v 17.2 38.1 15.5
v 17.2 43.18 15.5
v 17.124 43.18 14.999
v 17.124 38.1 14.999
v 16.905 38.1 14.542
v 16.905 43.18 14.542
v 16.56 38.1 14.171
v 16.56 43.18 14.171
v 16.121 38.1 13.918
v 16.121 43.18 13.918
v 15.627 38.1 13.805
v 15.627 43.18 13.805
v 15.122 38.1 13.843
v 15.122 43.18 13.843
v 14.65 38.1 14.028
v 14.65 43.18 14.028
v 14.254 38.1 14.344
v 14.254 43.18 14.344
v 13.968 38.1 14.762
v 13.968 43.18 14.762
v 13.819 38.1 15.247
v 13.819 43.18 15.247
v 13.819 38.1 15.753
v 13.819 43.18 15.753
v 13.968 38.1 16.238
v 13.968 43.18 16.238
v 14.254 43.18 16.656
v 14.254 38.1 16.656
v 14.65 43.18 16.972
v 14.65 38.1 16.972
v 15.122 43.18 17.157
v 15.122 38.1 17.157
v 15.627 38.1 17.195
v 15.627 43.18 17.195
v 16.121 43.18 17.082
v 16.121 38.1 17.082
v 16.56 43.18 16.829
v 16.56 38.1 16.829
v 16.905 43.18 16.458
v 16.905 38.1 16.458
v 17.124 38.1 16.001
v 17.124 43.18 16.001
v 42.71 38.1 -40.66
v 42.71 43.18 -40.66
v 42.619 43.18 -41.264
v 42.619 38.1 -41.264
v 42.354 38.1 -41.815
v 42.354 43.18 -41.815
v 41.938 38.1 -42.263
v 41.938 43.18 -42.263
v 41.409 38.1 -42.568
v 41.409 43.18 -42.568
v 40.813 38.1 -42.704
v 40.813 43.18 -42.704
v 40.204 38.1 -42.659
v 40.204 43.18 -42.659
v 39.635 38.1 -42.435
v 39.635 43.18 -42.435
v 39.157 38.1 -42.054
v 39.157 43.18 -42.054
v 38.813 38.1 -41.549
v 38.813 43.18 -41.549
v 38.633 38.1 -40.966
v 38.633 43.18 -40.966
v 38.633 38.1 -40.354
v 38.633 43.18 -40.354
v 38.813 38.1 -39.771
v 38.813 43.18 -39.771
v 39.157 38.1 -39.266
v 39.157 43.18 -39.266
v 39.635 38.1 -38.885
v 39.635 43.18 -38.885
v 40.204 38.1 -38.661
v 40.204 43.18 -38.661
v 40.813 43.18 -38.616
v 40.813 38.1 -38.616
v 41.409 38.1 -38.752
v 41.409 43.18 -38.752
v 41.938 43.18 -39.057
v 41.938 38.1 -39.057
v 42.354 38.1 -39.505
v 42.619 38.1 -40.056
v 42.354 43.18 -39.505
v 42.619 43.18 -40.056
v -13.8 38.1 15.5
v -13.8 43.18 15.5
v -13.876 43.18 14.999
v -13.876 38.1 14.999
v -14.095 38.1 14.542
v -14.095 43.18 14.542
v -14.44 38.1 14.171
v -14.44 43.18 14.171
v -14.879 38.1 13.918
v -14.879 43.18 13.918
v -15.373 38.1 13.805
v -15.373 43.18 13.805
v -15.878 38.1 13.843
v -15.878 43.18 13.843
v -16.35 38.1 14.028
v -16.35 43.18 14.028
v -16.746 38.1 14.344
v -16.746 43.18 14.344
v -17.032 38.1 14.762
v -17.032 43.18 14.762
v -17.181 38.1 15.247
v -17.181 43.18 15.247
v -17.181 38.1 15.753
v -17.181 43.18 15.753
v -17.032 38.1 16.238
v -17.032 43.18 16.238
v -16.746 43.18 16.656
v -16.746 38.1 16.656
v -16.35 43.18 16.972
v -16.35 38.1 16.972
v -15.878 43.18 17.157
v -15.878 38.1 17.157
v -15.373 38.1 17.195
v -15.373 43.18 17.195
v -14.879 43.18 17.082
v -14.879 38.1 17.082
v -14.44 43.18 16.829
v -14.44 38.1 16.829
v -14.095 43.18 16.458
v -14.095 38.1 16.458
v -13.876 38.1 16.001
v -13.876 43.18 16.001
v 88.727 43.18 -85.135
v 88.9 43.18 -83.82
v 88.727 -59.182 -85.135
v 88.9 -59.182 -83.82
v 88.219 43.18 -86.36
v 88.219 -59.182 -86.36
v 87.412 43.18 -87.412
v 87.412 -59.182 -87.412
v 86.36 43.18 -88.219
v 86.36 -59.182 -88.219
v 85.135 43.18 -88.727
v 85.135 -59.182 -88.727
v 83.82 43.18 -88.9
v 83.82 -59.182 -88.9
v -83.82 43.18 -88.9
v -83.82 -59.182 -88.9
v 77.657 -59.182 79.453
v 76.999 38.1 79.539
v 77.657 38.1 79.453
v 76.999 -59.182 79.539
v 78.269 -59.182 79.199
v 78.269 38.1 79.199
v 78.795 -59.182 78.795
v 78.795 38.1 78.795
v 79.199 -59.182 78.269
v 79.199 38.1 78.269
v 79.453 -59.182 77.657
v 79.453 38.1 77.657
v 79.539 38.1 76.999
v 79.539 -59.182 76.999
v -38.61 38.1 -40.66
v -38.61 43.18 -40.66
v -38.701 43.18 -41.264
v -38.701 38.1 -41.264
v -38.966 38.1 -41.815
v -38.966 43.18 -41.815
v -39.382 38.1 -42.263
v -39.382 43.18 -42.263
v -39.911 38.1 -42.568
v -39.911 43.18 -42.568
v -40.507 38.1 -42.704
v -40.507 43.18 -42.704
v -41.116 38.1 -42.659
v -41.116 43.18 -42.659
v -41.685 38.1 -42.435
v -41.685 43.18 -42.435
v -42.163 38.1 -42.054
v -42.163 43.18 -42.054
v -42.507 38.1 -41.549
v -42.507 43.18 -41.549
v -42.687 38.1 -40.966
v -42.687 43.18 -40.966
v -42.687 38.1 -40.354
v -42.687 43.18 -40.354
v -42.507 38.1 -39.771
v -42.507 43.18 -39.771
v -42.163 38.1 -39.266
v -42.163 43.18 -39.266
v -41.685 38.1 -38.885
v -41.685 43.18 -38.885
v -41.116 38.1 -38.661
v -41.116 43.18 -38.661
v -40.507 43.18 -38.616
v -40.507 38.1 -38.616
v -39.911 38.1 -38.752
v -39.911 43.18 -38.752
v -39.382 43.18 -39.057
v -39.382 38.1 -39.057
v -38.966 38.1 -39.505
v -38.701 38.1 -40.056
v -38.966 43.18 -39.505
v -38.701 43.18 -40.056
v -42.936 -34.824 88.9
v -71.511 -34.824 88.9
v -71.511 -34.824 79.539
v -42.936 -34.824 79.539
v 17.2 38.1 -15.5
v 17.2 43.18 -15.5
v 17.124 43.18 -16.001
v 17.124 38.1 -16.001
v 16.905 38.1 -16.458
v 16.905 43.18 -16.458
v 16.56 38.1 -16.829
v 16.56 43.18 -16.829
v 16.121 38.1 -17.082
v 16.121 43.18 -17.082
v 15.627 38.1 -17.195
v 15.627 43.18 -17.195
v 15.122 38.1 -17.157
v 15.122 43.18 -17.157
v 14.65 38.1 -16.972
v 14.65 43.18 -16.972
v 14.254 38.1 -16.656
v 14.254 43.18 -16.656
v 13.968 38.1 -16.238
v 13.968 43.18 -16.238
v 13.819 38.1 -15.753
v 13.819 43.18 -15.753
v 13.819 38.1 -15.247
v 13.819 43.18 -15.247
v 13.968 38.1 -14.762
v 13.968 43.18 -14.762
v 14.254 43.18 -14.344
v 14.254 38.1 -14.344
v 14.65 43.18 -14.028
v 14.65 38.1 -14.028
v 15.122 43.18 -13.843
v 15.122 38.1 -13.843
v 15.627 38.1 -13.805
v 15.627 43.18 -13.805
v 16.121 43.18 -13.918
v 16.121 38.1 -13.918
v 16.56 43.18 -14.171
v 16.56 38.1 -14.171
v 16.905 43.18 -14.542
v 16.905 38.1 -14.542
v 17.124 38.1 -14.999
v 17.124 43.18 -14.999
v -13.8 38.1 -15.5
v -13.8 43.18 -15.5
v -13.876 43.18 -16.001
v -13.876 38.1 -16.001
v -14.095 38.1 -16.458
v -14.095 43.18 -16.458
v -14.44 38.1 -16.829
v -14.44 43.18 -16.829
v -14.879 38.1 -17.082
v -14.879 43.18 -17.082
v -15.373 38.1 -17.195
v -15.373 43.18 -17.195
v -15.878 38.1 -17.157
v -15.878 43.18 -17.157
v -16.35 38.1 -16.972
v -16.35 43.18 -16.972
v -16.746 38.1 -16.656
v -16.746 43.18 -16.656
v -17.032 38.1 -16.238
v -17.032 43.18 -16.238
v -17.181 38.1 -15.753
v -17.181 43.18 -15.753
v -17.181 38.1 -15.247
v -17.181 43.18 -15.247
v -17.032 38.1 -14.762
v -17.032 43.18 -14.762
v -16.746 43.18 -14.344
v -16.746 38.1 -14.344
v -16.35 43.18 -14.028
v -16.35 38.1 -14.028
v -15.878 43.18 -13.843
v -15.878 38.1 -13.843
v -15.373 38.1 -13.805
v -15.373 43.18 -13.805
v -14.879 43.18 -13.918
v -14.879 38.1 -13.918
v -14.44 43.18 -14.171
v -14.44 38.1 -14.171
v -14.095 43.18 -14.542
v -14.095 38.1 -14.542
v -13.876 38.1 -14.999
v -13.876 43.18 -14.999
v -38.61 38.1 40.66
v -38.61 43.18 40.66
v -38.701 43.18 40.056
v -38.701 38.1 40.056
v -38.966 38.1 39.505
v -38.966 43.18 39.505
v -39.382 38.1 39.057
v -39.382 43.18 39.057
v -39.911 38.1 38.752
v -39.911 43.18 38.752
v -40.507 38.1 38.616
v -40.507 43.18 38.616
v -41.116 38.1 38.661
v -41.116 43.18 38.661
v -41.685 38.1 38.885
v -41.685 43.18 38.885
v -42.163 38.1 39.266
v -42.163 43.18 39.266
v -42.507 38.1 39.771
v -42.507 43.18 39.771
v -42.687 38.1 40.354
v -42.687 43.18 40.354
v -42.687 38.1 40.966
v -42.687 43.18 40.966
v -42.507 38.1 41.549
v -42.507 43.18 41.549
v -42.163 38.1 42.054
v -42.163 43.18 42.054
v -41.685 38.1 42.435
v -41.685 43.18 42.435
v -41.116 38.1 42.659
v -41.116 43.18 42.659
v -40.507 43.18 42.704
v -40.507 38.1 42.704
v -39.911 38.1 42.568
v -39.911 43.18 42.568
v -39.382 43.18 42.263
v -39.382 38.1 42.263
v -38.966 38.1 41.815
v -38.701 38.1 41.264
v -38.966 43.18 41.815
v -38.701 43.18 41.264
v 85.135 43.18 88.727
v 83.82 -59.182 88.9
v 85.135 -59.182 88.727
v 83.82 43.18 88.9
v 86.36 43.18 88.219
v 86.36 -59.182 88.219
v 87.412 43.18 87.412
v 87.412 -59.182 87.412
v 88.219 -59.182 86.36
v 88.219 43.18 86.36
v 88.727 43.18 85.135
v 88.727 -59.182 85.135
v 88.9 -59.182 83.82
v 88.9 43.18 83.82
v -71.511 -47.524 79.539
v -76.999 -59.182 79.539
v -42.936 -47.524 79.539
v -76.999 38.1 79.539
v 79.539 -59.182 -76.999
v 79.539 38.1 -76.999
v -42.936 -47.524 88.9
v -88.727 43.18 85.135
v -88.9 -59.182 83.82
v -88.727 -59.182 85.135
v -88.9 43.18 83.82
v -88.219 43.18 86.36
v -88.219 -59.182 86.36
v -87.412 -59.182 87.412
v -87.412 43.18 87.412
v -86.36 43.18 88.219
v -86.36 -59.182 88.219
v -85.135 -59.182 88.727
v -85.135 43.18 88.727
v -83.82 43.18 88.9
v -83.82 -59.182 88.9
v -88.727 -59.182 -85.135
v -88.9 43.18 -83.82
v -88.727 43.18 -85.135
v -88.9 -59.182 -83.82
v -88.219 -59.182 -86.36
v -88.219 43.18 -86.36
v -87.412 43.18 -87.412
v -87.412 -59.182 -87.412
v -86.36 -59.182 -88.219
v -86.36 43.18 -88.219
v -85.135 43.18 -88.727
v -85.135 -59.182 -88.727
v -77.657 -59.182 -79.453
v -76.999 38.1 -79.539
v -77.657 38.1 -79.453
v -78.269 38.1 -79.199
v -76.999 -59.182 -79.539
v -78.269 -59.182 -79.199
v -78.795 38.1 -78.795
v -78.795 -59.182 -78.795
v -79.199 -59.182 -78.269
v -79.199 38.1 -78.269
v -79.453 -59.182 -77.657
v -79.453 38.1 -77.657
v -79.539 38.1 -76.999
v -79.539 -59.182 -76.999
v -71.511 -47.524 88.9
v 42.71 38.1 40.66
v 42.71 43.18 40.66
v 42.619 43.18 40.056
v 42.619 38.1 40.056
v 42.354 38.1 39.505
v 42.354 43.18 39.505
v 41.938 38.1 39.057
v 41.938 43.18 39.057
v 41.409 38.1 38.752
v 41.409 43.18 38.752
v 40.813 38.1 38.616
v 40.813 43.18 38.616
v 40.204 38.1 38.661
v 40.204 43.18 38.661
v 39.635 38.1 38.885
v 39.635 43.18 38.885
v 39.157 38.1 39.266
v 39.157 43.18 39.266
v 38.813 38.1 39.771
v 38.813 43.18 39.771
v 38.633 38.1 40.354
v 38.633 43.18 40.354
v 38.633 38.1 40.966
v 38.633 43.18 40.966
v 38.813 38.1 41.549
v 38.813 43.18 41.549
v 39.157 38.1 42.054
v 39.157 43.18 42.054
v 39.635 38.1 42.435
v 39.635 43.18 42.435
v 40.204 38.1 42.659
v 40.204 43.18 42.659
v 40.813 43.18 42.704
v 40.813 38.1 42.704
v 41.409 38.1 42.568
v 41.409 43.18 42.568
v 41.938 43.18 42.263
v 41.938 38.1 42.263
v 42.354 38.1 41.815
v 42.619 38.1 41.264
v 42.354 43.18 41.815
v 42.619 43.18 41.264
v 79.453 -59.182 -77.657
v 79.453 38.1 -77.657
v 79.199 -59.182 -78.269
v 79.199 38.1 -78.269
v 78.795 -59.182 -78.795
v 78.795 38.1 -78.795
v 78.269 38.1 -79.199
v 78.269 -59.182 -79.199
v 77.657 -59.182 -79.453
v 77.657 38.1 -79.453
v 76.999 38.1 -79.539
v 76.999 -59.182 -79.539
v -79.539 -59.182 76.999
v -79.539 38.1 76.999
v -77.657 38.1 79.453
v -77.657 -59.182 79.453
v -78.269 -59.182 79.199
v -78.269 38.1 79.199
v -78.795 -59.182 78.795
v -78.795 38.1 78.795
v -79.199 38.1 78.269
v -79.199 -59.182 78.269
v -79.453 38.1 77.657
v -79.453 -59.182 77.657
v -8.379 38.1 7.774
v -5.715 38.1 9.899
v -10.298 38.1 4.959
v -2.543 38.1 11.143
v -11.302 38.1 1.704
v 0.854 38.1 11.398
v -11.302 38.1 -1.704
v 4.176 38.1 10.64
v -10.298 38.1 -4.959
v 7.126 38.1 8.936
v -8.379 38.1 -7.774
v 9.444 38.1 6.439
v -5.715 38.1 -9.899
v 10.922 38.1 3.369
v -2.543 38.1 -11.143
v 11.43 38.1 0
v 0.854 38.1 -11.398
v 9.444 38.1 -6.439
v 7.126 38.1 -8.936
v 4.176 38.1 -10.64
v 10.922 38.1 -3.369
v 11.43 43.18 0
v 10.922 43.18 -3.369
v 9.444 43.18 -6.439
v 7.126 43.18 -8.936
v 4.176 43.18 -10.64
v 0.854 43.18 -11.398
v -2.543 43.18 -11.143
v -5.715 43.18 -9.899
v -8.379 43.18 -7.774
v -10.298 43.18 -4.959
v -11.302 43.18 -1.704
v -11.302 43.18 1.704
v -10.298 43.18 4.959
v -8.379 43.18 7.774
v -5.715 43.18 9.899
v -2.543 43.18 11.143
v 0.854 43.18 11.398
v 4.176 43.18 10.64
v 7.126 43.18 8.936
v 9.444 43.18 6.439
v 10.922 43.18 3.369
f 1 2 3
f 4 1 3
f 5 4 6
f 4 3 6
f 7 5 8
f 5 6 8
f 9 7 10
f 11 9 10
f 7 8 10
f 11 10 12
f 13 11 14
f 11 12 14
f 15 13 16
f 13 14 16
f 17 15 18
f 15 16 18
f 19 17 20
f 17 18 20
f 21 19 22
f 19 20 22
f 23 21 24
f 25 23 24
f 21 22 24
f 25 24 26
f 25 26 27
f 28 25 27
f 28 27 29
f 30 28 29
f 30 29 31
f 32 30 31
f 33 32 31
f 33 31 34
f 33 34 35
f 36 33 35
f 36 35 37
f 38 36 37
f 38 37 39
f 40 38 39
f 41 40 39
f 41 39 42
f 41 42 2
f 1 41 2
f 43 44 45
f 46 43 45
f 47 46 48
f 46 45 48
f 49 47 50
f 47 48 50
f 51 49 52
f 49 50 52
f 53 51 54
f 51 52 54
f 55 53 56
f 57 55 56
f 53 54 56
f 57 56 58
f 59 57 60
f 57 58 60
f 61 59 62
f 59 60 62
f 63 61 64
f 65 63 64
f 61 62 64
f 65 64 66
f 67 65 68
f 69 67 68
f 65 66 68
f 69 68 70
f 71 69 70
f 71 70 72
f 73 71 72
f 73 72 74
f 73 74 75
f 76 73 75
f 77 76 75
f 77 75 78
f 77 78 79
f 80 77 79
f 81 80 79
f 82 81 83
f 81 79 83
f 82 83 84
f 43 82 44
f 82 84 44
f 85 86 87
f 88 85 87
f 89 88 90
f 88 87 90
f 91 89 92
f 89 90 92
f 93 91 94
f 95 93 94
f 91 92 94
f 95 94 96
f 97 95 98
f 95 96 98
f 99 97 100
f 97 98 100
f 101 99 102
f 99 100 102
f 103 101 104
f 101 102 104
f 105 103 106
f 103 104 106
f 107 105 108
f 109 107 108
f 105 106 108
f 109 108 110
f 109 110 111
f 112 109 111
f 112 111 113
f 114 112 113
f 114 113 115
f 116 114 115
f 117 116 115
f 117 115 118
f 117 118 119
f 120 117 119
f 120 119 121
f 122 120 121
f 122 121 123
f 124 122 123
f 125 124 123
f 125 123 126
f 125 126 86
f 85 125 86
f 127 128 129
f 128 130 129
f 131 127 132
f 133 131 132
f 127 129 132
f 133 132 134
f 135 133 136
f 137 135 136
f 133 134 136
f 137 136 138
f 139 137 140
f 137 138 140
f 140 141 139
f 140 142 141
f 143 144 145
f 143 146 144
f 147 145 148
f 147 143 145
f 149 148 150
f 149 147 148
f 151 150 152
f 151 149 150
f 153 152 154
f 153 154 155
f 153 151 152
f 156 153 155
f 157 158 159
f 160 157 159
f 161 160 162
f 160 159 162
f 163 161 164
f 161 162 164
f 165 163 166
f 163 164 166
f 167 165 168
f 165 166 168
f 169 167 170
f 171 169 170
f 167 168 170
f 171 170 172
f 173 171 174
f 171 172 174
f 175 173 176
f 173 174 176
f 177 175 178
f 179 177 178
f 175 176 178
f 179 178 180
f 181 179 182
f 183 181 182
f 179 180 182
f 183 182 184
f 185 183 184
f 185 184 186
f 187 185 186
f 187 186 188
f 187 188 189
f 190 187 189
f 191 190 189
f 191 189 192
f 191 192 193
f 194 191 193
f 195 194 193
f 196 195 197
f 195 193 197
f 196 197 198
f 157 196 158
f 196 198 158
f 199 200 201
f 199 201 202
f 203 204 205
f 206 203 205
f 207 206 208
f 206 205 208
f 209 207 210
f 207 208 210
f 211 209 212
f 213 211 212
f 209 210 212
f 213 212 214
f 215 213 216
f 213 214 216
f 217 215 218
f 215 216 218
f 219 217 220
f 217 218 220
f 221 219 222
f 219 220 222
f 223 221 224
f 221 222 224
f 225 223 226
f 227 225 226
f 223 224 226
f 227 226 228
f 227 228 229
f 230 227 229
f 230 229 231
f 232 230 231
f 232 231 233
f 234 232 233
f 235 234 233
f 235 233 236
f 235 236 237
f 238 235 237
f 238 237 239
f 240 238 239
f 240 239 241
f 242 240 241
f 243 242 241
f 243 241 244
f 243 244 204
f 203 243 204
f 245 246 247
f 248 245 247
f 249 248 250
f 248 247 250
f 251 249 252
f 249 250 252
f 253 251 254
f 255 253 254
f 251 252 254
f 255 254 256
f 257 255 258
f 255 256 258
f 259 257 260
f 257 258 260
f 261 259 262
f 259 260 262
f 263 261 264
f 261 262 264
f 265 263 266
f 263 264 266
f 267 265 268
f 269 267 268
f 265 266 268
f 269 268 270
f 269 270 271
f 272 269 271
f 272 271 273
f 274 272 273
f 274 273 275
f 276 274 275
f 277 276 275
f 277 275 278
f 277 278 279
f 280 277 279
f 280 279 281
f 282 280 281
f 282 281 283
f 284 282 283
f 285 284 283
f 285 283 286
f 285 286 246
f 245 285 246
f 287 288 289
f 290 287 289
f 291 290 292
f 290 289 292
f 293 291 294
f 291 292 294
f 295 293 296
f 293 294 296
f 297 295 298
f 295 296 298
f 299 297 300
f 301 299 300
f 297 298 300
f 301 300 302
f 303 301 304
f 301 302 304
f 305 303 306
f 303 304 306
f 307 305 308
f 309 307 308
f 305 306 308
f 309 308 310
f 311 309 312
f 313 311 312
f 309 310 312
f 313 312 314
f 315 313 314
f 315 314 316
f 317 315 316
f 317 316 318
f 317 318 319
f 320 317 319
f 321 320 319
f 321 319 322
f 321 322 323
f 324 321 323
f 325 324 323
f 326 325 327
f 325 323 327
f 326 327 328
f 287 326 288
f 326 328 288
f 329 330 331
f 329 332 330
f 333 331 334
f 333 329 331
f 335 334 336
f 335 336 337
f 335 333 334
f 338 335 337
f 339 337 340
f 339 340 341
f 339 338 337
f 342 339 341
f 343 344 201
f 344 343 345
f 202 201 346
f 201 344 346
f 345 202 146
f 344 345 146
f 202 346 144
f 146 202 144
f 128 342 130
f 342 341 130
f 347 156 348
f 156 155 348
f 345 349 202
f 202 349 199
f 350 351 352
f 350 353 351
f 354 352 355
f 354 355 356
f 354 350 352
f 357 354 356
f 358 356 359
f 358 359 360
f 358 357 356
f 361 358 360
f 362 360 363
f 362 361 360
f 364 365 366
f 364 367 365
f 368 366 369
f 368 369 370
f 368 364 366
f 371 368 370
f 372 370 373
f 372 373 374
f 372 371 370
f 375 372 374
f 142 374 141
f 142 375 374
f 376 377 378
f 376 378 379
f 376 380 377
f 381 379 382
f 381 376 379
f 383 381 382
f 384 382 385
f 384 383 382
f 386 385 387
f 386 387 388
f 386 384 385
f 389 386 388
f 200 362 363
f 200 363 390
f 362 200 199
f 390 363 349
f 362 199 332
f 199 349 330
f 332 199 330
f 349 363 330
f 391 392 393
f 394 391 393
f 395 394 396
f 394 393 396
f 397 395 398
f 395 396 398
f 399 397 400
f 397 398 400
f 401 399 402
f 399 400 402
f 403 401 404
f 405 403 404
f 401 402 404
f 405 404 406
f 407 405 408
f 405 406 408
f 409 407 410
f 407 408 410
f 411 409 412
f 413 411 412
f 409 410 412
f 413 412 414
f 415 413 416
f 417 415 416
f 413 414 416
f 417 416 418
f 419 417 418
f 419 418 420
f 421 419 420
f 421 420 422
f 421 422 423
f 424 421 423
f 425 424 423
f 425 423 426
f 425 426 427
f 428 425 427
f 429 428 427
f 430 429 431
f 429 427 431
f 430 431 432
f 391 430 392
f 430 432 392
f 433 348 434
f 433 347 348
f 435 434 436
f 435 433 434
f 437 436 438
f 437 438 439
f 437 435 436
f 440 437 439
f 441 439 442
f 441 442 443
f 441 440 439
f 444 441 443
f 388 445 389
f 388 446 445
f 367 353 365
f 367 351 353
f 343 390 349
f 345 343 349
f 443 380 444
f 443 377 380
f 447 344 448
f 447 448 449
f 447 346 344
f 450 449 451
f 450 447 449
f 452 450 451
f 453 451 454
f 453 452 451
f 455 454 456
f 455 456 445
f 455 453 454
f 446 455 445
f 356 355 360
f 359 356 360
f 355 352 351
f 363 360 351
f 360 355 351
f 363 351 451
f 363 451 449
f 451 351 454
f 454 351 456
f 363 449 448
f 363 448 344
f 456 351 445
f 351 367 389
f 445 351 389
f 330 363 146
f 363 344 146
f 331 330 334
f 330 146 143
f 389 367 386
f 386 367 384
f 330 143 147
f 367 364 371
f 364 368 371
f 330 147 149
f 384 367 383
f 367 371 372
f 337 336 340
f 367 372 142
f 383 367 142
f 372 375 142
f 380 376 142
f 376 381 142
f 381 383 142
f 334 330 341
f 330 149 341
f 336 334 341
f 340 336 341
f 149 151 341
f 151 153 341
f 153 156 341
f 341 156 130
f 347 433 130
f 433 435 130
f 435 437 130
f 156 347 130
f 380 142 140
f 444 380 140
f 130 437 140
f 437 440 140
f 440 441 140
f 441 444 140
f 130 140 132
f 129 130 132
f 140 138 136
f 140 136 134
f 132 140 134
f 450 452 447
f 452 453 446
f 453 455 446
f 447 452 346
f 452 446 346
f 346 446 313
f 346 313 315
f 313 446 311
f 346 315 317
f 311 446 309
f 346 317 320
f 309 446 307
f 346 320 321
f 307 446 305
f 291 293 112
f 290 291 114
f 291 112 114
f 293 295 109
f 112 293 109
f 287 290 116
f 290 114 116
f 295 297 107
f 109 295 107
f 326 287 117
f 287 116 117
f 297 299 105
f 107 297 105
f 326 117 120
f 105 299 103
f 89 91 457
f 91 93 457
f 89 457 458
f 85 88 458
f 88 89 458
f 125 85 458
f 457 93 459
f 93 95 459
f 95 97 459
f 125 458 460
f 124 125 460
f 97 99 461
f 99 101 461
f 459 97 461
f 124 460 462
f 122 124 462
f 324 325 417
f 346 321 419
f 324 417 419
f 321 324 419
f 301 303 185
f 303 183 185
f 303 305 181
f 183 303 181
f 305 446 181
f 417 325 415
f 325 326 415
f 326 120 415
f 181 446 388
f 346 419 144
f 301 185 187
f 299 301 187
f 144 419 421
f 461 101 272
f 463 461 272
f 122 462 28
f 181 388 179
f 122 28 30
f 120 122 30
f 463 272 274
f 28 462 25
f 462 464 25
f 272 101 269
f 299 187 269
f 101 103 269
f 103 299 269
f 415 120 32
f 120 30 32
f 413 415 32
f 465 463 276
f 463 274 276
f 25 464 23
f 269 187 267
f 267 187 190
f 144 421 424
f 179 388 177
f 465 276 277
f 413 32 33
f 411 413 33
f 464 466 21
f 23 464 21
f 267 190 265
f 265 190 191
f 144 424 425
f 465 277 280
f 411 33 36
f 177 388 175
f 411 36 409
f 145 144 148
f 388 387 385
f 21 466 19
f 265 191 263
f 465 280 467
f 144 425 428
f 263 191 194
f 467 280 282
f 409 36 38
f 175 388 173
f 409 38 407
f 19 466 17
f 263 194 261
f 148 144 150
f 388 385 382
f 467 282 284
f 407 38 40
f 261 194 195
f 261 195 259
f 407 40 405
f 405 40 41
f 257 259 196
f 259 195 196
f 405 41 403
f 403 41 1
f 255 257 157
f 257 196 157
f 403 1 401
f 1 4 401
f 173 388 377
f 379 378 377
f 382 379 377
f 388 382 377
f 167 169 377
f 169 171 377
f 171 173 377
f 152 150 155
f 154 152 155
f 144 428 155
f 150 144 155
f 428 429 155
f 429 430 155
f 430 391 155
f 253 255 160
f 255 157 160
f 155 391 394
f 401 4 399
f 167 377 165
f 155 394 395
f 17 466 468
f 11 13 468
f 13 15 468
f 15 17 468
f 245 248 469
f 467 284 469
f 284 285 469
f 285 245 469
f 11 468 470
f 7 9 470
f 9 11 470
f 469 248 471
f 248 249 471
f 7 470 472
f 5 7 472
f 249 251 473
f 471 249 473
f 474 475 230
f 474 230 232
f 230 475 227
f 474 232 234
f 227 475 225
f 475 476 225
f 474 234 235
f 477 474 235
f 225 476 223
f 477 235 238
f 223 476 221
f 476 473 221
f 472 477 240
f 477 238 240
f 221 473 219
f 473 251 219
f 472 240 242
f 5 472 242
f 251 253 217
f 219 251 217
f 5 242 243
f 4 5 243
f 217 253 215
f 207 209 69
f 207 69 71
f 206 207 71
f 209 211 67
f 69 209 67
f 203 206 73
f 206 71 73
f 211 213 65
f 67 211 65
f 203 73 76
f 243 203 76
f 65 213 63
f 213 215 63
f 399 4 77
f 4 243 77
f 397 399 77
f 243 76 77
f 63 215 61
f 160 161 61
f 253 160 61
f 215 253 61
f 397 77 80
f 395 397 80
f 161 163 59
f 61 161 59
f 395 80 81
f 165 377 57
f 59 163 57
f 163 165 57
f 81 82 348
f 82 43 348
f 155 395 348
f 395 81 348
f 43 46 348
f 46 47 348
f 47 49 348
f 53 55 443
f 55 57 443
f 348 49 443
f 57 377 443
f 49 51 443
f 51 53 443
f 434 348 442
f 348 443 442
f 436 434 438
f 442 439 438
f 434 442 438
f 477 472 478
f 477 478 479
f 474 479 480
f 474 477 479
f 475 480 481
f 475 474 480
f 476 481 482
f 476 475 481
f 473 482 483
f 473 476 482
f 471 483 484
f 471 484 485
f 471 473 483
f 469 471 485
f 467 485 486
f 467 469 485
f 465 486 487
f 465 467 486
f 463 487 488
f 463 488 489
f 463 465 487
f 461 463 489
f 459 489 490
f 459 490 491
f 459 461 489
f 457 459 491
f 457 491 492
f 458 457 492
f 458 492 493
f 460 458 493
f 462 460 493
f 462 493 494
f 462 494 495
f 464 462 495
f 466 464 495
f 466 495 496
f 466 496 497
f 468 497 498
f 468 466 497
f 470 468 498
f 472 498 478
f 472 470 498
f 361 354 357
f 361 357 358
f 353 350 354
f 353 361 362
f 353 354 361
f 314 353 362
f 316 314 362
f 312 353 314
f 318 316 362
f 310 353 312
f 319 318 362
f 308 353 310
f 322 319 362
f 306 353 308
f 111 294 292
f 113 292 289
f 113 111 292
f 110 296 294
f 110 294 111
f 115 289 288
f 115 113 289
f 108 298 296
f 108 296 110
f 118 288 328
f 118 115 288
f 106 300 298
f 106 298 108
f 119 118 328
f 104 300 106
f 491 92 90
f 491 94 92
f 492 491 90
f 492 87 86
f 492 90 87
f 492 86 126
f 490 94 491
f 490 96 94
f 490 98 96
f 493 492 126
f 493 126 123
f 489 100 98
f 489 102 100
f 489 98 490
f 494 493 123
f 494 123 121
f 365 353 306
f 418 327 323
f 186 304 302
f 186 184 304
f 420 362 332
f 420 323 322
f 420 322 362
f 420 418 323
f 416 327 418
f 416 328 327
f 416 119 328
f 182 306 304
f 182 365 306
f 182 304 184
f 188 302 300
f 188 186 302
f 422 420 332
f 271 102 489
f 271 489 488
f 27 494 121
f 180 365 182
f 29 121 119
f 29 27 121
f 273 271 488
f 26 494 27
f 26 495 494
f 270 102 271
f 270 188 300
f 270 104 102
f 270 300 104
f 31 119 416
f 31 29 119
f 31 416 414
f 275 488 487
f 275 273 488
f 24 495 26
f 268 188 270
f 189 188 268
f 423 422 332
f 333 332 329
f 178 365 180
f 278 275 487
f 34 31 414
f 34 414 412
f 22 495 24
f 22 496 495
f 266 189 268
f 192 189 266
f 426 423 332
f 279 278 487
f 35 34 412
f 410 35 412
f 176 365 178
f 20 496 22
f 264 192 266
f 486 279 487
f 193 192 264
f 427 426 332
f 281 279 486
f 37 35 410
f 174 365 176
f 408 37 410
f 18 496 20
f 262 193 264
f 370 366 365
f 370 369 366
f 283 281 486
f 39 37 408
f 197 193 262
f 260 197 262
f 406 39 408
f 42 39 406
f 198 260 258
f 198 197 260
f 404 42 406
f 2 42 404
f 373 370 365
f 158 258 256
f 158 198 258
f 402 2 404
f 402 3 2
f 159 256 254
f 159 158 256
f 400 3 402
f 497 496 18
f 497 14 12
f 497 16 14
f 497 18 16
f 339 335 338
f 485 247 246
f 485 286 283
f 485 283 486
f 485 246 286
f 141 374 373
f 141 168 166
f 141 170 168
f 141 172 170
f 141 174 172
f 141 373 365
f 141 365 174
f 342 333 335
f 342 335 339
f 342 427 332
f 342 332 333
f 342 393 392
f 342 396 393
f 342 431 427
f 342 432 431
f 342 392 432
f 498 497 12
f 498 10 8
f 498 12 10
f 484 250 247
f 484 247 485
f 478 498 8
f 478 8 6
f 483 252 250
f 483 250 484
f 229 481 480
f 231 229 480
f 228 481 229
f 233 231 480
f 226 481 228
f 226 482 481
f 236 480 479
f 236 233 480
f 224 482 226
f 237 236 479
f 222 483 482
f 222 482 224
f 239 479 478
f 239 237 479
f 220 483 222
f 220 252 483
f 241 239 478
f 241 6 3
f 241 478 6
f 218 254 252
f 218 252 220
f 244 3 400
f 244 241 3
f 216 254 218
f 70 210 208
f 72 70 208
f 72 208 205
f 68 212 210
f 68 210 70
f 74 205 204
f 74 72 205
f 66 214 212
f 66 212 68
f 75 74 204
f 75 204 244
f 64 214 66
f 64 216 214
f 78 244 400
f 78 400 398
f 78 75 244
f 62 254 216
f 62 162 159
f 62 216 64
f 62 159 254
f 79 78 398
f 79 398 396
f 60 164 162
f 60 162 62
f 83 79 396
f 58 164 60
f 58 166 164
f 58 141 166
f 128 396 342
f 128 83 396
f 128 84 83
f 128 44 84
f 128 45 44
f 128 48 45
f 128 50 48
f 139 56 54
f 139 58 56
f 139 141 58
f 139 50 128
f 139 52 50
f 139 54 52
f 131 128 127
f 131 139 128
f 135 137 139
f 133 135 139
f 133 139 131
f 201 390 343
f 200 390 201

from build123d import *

# Parameters (mm, degrees)
SKETCH1_W                = 177.8
SKETCH1_H                = 177.8
SKETCH1_W_2              = 159.078855478
SKETCH1_H_2              = 159.078855478
BOSS_EXTRUDE1_DEPTH      = 38.1
BOSS_EXTRUDE1_DEPTH_BACK = 59.182
BOSS_EXTRUDE3_START      = 38.1
SKETCH1_5_W              = 177.8
SKETCH1_5_H              = 177.8
SKETCH1_5_W_2            = 159.078855478
SKETCH1_5_H_2            = 159.078855478
SKETCH1_5_R              = 11.43
BOSS_EXTRUDE3_DEPTH      = 5.08
FILLET1_R                = 5.08
SKETCH3_R                = 1.7
CUT_EXTRUDE1_DEPTH       = 103.362
FILLET2_R                = 2.54
SKETCH4_R                = 2.05
CUT_EXTRUDE2_DEPTH       = 5.08
SKETCH5_W                = 28.575
SKETCH5_H                = 12.7
CUT_EXTRUDE3_DEPTH       = 9.360572


with BuildPart() as part:
    # Sketch1 → Boss-Extrude1 (new body, two sides)
    with BuildSketch(Plane(origin=(0, 0, 0), x_dir=(1, 0, 0), z_dir=(0, 1, 0))) as boss_extrude1_sk:
        Rectangle(SKETCH1_W, SKETCH1_H)
        Rectangle(SKETCH1_W_2, SKETCH1_H_2, mode=Mode.SUBTRACT)
    extrude(amount=BOSS_EXTRUDE1_DEPTH)
    extrude(boss_extrude1_sk.sketch, amount=-BOSS_EXTRUDE1_DEPTH_BACK)

    # Sketch1<5> → Boss-Extrude3 (add)
    with BuildSketch(Plane(origin=(0, 0, 0), x_dir=(1, 0, 0), z_dir=(0, 1, 0)).offset(BOSS_EXTRUDE3_START)):
        Rectangle(SKETCH1_5_W, SKETCH1_5_H)
        Rectangle(SKETCH1_5_W_2, SKETCH1_5_H_2, mode=Mode.SUBTRACT)
        Rectangle(SKETCH1_5_W_2, SKETCH1_5_H_2)
        Circle(SKETCH1_5_R, mode=Mode.SUBTRACT)
    extrude(amount=BOSS_EXTRUDE3_DEPTH)

    # Fillet1
    fillet1_edges = [part.edges().sort_by_distance(p)[0] for p in [
        (-88.9, -8.001, 88.9),
        (-88.9, -8.001, -88.9),
        (88.9, -8.001, -88.9),
        (88.9, -8.001, 88.9),
    ]]
    fillet(fillet1_edges, radius=FILLET1_R)

    # Sketch3 → Cut-Extrude1 (cut, through all)
    with BuildSketch(Plane(origin=(0, 43.18, 0), x_dir=(1, 0, 0), z_dir=(0, 1, 0))):
        with Locations((-15.5, 15.5)):
            Circle(SKETCH3_R)
        with Locations((-15.5, -15.5)):
            Circle(SKETCH3_R)
        with Locations((15.5, 15.5)):
            Circle(SKETCH3_R)
        with Locations((15.5, -15.5)):
            Circle(SKETCH3_R)
    extrude(amount=-CUT_EXTRUDE1_DEPTH, mode=Mode.SUBTRACT)

    # Fillet2
    fillet2_edges = [part.edges().sort_by_distance(p)[0] for p in [
        (79.539427739, -10.541, -79.539427739),
        (-79.539427739, -10.541, -79.539427739),
        (-79.539427739, -10.541, 79.539427739),
        (79.539427739, -10.541, 79.539427739),
    ]]
    fillet(fillet2_edges, radius=FILLET2_R)

    # Sketch4 → Cut-Extrude2 (cut)
    with BuildSketch(Plane(origin=(0, 43.18, 0), x_dir=(1, 0, 0), z_dir=(0, 1, 0))):
        with Locations((-40.66, 40.66)):
            Circle(SKETCH4_R)
        with Locations((40.66, 40.66)):
            Circle(SKETCH4_R)
        with Locations((-40.66, -40.66)):
            Circle(SKETCH4_R)
        with Locations((40.66, -40.66)):
            Circle(SKETCH4_R)
    extrude(amount=-CUT_EXTRUDE2_DEPTH, mode=Mode.SUBTRACT)

    # Sketch5 → Cut-Extrude3 (cut)
    with BuildSketch(Plane.XY.offset(88.9)):
        with Locations((-57.223240987, -41.174341157)):
            Rectangle(SKETCH5_W, SKETCH5_H)
    extrude(amount=-CUT_EXTRUDE3_DEPTH, mode=Mode.SUBTRACT)


solid = part.part
